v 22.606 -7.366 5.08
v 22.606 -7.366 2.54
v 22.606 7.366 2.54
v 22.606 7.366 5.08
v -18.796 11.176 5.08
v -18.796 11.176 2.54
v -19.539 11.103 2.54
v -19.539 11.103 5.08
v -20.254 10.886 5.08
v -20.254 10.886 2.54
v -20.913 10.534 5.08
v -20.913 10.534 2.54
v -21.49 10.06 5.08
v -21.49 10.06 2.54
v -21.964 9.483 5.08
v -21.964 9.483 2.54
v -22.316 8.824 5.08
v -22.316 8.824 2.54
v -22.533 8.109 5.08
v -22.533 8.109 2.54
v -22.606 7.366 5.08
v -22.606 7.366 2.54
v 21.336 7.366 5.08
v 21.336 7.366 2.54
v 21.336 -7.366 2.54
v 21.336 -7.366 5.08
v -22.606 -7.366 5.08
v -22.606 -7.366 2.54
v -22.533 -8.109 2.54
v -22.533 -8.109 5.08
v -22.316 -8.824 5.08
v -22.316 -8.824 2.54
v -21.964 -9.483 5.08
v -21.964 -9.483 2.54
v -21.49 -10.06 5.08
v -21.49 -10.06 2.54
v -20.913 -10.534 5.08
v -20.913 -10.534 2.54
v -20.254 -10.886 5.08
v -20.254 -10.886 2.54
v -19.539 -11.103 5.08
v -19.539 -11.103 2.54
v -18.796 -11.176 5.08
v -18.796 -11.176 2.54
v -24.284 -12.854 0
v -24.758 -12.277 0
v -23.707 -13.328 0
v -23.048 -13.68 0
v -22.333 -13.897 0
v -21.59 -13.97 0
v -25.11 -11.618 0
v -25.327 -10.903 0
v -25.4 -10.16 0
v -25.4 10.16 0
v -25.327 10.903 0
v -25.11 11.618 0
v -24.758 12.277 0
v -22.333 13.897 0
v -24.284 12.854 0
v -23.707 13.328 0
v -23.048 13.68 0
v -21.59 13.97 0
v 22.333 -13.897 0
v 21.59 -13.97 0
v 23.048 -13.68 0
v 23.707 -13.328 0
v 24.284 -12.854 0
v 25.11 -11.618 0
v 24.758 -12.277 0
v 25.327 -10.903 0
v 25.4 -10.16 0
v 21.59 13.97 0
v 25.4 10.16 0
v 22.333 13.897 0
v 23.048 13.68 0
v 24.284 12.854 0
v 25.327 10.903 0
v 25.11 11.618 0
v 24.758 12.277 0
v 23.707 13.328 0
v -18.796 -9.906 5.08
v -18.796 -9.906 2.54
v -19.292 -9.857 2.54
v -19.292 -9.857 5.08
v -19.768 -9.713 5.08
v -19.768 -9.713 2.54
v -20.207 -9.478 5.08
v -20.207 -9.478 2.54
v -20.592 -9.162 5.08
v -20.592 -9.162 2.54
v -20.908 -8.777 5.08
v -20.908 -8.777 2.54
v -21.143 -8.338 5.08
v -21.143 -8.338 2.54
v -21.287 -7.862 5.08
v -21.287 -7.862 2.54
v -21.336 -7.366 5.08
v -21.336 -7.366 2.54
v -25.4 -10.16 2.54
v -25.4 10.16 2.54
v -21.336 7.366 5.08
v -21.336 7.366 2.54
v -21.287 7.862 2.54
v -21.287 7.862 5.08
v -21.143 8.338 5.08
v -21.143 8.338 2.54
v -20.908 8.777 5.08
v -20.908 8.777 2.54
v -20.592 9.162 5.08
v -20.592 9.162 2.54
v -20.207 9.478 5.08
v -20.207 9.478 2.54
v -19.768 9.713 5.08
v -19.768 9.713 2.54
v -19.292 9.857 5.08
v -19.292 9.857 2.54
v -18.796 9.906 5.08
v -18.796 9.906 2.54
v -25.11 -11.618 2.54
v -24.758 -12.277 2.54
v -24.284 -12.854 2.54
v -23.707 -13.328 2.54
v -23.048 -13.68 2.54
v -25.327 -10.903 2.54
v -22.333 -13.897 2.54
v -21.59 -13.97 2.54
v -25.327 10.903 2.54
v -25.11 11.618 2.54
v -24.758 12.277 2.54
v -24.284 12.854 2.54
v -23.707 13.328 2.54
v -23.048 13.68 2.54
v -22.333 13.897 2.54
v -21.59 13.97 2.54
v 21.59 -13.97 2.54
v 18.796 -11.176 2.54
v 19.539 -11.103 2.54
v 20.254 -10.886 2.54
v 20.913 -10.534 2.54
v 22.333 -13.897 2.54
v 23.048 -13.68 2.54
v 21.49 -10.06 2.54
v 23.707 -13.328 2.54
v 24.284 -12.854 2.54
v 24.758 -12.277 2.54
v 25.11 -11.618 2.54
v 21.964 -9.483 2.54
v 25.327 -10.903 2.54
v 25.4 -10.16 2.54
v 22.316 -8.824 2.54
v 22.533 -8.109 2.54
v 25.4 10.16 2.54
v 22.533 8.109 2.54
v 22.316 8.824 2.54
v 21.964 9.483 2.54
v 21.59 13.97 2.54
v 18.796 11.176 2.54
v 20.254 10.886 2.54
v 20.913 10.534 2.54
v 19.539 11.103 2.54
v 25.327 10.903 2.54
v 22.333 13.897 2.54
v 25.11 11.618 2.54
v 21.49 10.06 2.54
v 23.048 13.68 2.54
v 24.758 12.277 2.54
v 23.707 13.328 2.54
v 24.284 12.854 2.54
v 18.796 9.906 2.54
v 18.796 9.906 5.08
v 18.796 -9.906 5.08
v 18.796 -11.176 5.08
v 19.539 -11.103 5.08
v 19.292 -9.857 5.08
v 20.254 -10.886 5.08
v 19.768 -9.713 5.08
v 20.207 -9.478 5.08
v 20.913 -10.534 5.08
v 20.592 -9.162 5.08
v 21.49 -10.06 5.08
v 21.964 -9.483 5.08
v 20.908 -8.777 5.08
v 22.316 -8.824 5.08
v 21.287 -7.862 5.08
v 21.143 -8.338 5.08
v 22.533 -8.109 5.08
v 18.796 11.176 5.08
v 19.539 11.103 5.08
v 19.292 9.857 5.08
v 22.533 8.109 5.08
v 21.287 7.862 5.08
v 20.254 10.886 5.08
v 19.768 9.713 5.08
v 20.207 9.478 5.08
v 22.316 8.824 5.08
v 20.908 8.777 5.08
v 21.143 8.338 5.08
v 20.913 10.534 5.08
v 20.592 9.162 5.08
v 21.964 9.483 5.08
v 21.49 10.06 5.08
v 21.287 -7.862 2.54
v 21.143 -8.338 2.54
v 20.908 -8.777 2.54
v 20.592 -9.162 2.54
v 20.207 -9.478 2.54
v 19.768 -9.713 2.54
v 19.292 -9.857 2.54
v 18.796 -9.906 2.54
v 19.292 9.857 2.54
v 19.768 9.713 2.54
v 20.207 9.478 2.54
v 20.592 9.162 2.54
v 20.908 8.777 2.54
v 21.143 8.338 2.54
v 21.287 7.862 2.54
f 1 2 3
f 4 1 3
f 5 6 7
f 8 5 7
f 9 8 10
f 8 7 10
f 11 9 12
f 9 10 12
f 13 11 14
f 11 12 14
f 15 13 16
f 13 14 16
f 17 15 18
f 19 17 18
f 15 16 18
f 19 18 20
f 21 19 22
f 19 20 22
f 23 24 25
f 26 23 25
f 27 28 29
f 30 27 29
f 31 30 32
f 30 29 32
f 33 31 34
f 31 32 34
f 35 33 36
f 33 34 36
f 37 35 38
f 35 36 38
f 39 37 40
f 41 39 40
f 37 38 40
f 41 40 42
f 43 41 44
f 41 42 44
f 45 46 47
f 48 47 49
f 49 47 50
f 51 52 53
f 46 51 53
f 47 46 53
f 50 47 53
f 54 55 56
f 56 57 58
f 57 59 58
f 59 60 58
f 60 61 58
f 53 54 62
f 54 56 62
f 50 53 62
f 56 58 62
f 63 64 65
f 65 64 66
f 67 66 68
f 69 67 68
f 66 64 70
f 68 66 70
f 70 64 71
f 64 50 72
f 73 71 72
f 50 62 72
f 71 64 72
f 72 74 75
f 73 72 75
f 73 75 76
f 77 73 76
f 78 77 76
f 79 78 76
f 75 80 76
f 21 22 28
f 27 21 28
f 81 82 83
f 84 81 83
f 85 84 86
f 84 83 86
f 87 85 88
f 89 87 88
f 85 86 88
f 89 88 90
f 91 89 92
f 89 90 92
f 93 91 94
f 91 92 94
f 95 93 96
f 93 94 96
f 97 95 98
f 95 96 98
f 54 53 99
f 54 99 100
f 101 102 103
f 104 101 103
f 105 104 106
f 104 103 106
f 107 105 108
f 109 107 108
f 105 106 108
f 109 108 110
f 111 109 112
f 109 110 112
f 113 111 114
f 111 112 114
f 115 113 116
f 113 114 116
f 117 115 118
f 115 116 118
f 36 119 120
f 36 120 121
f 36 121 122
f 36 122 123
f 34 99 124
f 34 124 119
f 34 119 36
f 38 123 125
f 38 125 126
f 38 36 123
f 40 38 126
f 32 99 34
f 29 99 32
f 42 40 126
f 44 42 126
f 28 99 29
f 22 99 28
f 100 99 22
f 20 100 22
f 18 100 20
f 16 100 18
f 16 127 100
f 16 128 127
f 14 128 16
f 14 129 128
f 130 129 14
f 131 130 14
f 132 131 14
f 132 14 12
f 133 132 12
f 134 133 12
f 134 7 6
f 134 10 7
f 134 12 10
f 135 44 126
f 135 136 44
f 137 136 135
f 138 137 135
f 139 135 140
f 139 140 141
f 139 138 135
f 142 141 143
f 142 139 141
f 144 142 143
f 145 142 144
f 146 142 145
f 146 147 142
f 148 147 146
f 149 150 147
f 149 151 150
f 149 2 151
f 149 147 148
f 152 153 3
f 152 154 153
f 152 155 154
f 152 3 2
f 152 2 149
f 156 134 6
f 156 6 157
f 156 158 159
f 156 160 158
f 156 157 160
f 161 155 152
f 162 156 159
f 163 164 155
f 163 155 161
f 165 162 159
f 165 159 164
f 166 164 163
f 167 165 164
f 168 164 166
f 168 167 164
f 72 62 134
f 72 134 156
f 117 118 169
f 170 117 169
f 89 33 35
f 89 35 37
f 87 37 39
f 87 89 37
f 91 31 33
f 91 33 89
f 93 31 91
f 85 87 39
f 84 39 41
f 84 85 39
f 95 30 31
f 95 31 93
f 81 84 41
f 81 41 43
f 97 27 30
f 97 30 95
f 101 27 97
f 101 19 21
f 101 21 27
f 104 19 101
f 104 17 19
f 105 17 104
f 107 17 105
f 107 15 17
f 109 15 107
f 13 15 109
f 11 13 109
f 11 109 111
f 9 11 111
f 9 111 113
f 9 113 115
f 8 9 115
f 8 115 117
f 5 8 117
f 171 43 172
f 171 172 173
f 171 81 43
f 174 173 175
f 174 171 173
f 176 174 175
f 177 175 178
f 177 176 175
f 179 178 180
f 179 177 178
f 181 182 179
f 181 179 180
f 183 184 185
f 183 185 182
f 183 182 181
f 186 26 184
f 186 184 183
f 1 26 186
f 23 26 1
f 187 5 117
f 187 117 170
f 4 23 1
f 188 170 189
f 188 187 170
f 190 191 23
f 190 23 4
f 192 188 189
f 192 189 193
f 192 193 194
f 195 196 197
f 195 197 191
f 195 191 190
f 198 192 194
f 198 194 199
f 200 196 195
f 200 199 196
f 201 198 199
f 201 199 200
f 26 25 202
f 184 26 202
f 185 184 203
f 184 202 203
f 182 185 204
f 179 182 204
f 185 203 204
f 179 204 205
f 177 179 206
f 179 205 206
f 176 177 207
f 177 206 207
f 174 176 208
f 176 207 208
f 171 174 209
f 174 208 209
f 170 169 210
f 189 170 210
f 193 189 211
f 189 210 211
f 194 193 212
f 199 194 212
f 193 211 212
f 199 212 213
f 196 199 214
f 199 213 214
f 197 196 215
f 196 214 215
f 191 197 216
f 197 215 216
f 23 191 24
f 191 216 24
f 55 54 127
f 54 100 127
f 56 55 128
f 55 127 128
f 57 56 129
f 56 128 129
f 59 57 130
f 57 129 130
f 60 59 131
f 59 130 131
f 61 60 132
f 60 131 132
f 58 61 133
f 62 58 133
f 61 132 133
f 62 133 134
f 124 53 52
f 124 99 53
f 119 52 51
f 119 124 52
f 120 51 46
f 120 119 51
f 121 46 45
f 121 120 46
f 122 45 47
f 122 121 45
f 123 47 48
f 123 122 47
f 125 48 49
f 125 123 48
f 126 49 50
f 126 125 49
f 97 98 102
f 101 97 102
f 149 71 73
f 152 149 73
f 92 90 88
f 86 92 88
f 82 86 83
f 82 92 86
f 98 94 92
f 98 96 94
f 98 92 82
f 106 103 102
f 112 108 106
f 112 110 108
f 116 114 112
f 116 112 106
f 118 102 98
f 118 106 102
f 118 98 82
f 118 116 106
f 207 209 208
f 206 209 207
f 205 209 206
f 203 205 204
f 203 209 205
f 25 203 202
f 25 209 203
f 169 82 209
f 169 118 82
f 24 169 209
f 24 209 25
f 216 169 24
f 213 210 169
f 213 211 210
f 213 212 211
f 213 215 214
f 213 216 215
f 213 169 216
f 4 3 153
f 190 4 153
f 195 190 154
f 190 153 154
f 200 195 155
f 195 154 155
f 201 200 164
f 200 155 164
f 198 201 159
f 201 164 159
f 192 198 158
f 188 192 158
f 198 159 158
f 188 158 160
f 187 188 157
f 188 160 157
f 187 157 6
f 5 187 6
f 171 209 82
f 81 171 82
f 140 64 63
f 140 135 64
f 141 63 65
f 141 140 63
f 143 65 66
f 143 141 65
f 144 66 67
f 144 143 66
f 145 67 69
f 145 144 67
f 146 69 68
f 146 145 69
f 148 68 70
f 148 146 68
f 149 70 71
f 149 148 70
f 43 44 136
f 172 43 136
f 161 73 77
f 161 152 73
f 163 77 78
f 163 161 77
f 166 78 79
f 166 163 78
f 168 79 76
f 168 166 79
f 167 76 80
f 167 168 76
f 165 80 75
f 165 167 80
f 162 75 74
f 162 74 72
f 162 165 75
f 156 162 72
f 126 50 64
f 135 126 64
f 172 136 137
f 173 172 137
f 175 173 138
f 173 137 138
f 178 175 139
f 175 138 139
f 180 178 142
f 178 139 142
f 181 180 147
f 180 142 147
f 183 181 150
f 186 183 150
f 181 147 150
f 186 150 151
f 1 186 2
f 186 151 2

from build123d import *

# Parameters (mm, degrees)
F0_W     = 50.8
F0_H     = 27.94
F1_DEPTH = 2.54
F2_R     = 3.81
F4_DEPTH = 2.54


with BuildPart() as f1:
    # F0 (on Top) → F1 (new body)
    with BuildSketch(Plane.XY):
        Rectangle(F0_W, F0_H)
    extrude(amount=F1_DEPTH)

    # F2
    f2_edges = [f1.edges().sort_by_distance(p)[0] for p in [
        (-25.4, 13.97, 1.27),
        (25.4, 13.97, 1.27),
        (-25.4, -13.97, 1.27),
        (25.4, -13.97, 1.27),
    ]]
    fillet(f2_edges, radius=F2_R)

    # F3 (on face) → F4 (join)
    with BuildSketch(Plane.XY.offset(2.54)):
        with BuildLine():
            Line((-18.796, -11.176), (18.796, -11.176))
            ThreePointArc((18.796, -11.176), (21.490077, -10.060077), (22.606, -7.366))
            Line((22.606, -7.366), (22.606, 7.366))
            ThreePointArc((22.606, 7.366), (21.490077, 10.060077), (18.796, 11.176))
            Line((18.796, 11.176), (-18.796, 11.176))
            ThreePointArc((-18.796, 11.176), (-21.490077, 10.060077), (-22.606, 7.366))
            Line((-22.606, 7.366), (-22.606, -7.366))
            ThreePointArc((-22.606, -7.366), (-21.490077, -10.060077), (-18.796, -11.176))
        make_face()
        with BuildLine():
            ThreePointArc((18.796, 9.906), (20.592051, 9.162051), (21.336, 7.366))
            Line((21.336, 7.366), (21.336, -7.366))
            ThreePointArc((21.336, -7.366), (20.592051, -9.162051), (18.796, -9.906))
            Line((18.796, -9.906), (-18.796, -9.906))
            ThreePointArc((-18.796, -9.906), (-20.592051, -9.162051), (-21.336, -7.366))
            Line((-21.336, -7.366), (-21.336, 7.366))
            ThreePointArc((-21.336, 7.366), (-20.592051, 9.162051), (-18.796, 9.906))
            Line((-18.796, 9.906), (18.796, 9.906))
        make_face(mode=Mode.SUBTRACT)
    extrude(amount=F4_DEPTH)


solid = f1.part
